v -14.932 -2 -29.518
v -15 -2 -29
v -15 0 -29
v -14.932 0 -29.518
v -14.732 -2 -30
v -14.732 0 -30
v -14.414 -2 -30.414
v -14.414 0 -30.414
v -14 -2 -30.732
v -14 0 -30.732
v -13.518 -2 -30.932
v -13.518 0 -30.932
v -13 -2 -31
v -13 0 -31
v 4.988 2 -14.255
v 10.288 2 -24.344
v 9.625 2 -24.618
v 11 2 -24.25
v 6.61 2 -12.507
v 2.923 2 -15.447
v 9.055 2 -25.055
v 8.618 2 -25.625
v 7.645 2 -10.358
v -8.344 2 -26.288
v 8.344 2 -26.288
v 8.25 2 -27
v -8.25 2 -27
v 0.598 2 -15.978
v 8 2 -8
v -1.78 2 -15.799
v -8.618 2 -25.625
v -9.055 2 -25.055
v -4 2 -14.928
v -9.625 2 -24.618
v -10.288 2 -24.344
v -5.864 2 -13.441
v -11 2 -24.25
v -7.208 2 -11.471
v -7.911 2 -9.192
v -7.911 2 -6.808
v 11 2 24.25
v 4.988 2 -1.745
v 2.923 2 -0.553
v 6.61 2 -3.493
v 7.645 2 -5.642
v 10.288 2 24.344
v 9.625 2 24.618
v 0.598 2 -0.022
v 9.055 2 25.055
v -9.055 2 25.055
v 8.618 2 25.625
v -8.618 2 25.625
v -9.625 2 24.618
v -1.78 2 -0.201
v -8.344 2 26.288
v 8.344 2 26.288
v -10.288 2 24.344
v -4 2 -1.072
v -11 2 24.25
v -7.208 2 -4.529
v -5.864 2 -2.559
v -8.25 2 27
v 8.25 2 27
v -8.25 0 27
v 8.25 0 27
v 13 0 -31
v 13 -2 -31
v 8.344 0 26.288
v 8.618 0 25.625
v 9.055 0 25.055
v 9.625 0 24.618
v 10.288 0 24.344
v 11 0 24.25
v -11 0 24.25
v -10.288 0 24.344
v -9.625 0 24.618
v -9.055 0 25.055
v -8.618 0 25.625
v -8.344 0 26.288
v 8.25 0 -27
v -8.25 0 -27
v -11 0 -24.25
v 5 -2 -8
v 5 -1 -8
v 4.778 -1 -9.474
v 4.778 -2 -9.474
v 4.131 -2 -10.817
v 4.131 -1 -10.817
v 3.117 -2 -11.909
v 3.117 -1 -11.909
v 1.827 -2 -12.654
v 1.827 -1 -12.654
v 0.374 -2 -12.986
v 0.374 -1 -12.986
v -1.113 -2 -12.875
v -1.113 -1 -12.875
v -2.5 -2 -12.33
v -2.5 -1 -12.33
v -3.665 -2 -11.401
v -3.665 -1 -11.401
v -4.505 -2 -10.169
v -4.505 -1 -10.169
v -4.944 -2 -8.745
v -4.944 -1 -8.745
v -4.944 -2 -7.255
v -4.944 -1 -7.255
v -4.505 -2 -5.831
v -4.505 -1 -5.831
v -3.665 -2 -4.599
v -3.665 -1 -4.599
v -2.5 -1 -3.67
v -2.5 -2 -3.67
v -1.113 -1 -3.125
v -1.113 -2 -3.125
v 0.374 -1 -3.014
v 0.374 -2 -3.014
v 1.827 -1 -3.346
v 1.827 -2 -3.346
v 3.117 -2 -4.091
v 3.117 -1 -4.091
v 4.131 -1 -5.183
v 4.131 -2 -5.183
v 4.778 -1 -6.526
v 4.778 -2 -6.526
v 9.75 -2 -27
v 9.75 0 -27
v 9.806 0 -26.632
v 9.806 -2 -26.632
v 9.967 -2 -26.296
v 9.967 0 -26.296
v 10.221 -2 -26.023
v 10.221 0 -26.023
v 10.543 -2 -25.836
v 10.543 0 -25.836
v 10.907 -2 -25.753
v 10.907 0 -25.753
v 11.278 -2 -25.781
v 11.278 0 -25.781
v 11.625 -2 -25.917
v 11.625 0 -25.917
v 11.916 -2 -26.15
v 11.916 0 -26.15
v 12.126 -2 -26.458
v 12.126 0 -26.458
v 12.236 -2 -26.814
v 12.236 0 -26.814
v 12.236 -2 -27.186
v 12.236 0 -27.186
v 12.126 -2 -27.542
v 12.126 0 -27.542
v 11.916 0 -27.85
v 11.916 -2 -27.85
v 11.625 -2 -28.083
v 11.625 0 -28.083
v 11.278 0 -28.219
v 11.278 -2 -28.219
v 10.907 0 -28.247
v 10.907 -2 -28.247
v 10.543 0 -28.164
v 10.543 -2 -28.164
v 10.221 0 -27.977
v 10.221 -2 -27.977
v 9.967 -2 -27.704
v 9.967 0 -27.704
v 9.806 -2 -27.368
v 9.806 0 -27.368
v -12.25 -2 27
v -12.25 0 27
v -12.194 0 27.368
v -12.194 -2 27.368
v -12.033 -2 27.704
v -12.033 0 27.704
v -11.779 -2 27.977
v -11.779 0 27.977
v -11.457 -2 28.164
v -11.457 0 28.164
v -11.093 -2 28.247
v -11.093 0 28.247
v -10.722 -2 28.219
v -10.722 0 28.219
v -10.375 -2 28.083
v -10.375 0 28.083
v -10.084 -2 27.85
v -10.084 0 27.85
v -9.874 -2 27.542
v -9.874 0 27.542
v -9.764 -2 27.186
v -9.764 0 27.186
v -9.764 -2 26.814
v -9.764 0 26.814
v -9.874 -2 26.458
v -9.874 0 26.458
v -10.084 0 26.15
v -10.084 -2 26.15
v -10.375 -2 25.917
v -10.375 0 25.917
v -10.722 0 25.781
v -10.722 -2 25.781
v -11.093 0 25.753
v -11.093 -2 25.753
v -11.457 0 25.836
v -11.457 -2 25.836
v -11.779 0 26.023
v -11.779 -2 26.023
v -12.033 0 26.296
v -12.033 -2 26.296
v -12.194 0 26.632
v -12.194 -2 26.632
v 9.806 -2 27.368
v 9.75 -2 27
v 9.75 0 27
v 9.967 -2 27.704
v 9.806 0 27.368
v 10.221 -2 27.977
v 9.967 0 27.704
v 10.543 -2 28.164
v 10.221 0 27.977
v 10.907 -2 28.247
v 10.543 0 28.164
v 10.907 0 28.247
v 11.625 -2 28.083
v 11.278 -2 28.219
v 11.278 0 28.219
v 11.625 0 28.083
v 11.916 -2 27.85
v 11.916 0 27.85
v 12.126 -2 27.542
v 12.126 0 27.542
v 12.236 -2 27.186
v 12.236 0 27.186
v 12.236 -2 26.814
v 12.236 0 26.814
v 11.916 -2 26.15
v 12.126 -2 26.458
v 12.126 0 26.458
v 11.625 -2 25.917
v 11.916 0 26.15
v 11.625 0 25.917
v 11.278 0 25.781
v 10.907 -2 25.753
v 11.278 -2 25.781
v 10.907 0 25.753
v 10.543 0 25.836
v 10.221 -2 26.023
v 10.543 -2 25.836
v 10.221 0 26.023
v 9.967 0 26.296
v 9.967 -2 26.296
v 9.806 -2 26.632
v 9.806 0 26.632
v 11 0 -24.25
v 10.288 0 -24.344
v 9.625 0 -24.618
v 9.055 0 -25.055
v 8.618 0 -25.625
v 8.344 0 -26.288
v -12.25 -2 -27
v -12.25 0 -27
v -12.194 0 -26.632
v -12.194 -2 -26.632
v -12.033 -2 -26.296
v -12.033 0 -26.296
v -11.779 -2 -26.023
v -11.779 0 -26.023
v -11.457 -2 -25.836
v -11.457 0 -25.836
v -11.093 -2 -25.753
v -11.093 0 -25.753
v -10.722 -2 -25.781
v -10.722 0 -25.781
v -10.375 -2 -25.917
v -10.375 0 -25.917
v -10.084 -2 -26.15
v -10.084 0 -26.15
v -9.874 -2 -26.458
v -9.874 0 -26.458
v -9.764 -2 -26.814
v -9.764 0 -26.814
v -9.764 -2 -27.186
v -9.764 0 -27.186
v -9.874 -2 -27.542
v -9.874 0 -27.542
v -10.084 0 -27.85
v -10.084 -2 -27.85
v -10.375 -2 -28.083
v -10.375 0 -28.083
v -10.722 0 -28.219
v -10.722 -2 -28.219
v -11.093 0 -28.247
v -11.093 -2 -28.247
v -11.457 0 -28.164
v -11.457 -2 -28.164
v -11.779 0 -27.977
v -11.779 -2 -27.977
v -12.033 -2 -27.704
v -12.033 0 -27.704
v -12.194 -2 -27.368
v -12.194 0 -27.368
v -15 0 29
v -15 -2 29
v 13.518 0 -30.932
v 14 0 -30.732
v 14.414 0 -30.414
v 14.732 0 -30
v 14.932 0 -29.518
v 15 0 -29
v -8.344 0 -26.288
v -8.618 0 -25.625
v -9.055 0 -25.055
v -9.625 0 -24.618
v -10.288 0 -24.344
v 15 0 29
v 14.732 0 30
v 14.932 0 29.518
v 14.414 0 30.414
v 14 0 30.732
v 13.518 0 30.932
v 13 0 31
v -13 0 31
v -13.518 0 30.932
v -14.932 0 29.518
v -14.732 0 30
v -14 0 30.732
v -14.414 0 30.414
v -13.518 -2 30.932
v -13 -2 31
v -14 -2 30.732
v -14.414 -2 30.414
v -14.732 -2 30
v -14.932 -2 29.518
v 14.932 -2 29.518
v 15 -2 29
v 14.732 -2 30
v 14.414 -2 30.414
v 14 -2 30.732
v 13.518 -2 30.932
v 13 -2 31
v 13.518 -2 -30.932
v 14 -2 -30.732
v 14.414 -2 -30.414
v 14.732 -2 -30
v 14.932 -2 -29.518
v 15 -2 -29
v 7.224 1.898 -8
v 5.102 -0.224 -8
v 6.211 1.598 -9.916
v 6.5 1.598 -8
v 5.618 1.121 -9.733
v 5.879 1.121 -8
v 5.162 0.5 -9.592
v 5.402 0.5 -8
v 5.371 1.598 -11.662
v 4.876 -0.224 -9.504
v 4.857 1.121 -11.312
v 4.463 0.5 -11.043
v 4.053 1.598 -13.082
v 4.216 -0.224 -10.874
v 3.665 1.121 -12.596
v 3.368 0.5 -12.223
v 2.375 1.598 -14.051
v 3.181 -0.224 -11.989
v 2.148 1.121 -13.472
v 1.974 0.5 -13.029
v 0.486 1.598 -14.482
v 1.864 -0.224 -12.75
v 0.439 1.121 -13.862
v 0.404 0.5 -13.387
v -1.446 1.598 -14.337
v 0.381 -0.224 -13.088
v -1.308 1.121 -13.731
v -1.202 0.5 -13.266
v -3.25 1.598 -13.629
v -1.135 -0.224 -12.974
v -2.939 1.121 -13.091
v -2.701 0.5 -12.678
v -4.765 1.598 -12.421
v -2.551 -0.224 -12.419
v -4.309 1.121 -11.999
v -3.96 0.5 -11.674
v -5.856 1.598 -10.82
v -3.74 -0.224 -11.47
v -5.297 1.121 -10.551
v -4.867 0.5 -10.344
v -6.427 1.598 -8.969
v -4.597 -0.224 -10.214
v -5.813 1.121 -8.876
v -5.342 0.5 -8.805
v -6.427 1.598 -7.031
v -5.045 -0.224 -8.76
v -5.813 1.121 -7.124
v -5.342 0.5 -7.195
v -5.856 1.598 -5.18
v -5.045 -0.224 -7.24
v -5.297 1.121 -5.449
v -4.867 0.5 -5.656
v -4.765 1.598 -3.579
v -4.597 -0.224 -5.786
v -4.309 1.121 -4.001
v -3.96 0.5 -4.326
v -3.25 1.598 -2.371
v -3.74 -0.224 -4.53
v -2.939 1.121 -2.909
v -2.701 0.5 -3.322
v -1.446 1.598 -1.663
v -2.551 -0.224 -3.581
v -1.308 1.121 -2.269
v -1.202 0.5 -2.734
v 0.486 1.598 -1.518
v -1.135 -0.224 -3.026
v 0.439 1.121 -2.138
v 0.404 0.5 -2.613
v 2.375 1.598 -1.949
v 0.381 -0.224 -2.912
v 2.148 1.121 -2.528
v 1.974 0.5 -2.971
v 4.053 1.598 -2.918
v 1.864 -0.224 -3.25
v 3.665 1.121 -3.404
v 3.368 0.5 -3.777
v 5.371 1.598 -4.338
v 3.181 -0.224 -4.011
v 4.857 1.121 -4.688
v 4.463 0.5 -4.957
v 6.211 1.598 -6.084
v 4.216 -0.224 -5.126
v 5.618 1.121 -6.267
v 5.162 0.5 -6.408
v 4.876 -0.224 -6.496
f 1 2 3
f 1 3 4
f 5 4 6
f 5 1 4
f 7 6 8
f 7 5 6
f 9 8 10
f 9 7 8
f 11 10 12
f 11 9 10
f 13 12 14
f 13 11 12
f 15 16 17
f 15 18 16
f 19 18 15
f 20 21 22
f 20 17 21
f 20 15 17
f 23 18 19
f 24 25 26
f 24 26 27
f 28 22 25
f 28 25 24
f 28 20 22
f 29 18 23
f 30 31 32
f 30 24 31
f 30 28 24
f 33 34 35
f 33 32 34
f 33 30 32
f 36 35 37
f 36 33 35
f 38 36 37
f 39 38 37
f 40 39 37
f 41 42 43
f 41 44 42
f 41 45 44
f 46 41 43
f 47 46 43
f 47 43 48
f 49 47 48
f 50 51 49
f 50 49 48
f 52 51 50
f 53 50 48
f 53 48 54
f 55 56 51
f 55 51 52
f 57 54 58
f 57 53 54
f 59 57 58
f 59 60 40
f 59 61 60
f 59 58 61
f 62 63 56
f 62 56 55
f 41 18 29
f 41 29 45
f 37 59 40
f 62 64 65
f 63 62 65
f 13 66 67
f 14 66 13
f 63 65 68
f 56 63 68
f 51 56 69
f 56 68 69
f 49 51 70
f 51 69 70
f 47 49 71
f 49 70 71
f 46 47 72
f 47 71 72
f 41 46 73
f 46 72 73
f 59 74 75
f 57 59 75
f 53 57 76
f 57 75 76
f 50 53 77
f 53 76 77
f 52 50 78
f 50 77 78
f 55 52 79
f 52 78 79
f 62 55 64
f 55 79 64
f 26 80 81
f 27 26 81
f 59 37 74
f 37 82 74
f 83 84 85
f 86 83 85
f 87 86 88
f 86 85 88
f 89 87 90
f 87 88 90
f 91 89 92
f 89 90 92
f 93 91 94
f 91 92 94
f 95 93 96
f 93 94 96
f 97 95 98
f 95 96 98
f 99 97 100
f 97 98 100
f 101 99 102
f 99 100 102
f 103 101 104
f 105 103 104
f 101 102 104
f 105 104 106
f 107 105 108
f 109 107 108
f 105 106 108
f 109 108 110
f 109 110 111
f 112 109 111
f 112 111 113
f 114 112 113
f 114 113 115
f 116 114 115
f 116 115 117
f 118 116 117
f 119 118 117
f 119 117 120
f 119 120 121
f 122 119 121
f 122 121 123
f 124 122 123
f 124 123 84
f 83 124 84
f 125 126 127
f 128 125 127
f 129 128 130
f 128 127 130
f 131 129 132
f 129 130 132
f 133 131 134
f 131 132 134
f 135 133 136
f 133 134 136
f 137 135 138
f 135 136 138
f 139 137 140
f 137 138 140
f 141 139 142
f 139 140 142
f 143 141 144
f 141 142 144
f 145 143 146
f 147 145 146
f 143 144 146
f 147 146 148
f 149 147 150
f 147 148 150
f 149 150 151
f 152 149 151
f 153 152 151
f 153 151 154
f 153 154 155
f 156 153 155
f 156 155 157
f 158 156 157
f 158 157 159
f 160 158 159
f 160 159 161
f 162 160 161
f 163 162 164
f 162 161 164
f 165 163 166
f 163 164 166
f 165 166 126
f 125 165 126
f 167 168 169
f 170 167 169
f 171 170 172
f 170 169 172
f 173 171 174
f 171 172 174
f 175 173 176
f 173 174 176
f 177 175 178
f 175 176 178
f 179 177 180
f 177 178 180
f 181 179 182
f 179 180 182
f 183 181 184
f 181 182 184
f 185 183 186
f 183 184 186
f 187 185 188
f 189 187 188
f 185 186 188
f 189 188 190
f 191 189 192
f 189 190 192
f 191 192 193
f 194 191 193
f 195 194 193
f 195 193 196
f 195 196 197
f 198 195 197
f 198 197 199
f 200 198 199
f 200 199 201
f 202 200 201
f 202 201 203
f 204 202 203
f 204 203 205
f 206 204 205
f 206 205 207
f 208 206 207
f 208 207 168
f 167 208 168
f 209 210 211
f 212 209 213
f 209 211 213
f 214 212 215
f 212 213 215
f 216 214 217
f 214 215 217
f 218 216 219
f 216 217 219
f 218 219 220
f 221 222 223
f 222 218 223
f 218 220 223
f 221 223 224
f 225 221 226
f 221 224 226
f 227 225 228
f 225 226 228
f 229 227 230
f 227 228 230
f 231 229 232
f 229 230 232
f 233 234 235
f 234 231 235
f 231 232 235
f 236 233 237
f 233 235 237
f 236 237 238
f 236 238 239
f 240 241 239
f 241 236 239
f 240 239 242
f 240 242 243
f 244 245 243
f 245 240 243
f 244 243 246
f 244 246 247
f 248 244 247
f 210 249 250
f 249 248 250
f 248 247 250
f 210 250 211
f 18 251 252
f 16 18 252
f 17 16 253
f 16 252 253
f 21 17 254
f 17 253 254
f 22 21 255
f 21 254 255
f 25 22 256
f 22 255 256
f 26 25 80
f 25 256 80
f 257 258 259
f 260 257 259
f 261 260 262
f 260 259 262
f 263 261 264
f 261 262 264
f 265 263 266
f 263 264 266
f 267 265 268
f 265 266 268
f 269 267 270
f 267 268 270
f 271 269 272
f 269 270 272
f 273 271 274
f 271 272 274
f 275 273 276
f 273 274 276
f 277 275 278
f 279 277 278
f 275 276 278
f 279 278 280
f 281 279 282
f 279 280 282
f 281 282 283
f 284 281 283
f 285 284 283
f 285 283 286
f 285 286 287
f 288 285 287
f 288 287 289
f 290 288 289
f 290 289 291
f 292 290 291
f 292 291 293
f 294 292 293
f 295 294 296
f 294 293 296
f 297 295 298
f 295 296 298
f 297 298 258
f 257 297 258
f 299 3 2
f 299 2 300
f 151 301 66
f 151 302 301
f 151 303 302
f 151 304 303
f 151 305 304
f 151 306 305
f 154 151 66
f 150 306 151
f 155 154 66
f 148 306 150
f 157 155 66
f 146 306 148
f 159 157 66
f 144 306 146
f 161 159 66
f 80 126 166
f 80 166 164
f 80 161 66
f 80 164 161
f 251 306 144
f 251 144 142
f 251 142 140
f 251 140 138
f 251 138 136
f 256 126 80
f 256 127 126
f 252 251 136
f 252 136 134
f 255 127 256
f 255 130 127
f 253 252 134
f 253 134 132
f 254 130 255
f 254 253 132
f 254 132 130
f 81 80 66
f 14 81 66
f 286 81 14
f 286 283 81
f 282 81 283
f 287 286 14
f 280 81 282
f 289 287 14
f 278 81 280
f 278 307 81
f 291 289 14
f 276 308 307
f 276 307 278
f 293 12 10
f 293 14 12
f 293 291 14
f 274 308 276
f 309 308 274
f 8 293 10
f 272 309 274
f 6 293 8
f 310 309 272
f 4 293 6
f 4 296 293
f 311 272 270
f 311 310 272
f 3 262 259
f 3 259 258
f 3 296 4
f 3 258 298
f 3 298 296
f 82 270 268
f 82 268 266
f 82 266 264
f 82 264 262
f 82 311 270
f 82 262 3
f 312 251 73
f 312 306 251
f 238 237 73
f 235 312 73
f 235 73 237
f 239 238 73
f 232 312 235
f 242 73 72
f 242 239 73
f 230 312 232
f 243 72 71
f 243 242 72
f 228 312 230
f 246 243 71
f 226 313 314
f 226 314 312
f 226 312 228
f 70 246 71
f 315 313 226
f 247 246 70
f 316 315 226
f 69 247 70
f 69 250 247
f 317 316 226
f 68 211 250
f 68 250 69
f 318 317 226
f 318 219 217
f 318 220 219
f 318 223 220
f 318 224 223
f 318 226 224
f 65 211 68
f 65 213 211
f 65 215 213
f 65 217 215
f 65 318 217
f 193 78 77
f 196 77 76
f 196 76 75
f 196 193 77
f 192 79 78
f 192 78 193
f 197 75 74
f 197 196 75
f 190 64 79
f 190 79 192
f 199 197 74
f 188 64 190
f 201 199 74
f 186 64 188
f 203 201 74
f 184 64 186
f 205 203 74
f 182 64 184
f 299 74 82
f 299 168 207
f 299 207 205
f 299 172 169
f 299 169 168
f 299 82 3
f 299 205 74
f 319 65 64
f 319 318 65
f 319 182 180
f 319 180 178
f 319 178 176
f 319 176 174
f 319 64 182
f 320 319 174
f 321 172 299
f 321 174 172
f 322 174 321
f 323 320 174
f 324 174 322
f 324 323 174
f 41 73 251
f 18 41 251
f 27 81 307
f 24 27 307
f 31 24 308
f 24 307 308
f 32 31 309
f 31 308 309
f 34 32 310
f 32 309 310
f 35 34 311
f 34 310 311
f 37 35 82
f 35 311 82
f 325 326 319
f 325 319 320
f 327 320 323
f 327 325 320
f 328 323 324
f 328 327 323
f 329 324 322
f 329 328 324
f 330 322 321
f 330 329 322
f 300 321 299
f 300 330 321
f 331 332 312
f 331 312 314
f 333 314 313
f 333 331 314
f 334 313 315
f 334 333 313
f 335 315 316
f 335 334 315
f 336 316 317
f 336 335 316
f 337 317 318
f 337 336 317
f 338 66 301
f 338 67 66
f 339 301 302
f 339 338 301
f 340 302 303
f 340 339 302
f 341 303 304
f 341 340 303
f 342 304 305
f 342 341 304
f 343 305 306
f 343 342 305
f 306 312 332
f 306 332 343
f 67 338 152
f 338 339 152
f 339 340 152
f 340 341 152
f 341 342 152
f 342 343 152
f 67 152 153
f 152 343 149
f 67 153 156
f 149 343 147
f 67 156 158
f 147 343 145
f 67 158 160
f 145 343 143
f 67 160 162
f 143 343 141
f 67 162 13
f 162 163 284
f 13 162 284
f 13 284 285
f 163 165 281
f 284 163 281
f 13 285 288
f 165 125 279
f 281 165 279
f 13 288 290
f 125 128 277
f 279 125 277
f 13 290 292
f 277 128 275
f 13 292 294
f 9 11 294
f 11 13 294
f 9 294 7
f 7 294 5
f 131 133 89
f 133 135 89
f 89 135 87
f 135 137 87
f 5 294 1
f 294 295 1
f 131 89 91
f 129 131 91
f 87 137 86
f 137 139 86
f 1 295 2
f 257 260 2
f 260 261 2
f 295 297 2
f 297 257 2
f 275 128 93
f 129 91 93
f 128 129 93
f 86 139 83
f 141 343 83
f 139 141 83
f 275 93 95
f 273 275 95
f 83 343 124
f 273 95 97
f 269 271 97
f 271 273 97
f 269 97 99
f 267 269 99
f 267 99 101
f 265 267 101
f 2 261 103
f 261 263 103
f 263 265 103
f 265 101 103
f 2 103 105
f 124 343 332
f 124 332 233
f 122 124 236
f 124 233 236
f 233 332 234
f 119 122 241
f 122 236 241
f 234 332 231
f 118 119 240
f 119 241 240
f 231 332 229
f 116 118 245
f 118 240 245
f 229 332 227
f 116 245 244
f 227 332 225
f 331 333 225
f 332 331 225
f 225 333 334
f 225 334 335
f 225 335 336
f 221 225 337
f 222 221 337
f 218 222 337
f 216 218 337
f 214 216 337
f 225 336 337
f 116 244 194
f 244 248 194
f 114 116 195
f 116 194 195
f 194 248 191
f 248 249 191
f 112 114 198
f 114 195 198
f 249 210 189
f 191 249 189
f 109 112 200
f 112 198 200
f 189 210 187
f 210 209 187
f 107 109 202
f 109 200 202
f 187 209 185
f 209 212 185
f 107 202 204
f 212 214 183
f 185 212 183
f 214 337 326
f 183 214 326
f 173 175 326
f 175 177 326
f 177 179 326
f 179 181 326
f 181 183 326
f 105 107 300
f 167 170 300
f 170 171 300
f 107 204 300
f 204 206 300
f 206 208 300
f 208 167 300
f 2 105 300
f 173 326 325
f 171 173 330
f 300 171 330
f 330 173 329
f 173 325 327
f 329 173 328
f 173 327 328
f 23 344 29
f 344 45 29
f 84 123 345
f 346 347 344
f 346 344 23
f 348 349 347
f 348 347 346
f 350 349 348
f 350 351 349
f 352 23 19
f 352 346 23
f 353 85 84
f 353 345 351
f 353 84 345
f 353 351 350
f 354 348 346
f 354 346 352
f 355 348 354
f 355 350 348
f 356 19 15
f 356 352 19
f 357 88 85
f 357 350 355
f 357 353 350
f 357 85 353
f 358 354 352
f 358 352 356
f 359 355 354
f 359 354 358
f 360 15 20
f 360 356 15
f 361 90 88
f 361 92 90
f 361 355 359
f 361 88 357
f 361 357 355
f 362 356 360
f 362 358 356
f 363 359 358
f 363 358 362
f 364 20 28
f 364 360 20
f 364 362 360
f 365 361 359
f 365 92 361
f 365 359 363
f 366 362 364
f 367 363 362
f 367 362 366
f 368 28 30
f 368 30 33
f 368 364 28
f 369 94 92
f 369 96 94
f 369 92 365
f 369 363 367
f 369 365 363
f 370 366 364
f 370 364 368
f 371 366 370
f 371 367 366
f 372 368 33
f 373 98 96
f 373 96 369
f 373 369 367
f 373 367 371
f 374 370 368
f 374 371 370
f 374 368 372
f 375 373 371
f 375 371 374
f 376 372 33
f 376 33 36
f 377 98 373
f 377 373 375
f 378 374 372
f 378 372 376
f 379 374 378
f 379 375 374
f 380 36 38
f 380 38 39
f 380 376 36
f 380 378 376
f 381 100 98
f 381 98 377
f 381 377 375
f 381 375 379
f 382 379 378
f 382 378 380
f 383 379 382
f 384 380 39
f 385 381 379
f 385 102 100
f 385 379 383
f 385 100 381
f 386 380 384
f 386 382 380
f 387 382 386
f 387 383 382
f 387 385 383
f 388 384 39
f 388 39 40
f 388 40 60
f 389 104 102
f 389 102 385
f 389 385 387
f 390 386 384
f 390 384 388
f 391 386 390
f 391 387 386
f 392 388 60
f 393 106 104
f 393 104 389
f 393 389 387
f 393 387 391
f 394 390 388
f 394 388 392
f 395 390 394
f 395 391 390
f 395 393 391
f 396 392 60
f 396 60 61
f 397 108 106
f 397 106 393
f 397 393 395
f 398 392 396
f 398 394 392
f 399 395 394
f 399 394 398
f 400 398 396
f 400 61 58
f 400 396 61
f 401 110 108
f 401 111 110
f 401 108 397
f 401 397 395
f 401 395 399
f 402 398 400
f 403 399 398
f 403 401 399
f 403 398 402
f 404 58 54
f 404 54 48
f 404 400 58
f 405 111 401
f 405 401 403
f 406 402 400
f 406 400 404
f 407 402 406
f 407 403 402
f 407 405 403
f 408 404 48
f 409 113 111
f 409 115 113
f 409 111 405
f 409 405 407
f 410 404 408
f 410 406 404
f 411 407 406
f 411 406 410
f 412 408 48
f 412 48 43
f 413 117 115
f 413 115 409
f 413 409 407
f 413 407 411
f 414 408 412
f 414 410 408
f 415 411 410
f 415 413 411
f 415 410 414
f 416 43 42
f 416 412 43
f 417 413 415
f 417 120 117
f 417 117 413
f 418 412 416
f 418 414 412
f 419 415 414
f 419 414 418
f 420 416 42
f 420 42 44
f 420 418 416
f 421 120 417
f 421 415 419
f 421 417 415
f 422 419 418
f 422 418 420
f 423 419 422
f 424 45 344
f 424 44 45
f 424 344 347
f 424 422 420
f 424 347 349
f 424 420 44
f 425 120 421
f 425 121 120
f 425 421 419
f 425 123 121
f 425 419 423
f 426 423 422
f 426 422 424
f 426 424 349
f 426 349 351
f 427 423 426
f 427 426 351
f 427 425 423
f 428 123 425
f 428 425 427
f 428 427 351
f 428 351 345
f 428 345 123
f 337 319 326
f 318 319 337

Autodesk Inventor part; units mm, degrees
ref_plane "YZ Plane" through (0, 0, 0) normal (1, 0, 0) x (0, 1, 0)
ref_plane "XZ Plane" through (0, 0, 0) normal (0, 1, 0) x (-1, 0, 0)
ref_plane "XY Plane" through (0, 0, 0) normal (0, 0, 1) x (1, 0, 0)
sketch "스케치1" plane through (0, 0, 0) normal (0, 1, 0) x (-1, 0, 0)
  line L0 (11, 27) -> (-11, 27)
  line L1 (-11, 27) -> (-11, -27)
  line L2 (-11, -27) -> (11, -27)
  line L3 (11, -27) -> (11, 27)
  line L4 (11, 27) -> (-11, -27) construction
  line L5 (-11, 27) -> (11, -27) construction
  line L6 (15, 31) -> (-15, 31)
  line L7 (-15, 31) -> (-15, -31)
  line L8 (-15, -31) -> (15, -31)
  line L9 (15, -31) -> (15, 31)
  circle A0 centre (11, 27) radius 1.25
  line L10 (0, 0) -> (0, -5.338)
  line L11 (0, 0) -> (0.8274, 0)
  line L12 (0, 0) -> (4.4604, 0)
  circle A1 centre (11, 27) radius 2.75
  circle A2 centre (11, -27) radius 1.25
  circle A3 centre (11, -27) radius 2.75
  circle A4 centre (-11, 27) radius 1.25
  circle A5 centre (-11, 27) radius 2.75
  circle A6 centre (-11, -27) radius 1.25
  circle A7 centre (-11, -27) radius 2.75
  point P0 (-11, -24.25)
  point P1 (-8.25, -27)
  point P2 (8.25, -27)
  point P3 (11, -24.25)
  point P4 (11, 24.25)
  point P5 (8.25, 27)
  point P6 (-8.25, 27)
  point P7 (-11, 24.25)
  dimension "d0" = 22
  dimension "d1" = 54
  dimension "d2" = 4
  dimension "d3" = 2.5
  dimension "d4" = 5.5
extrude "돌출1" add sketch "스케치1" against normal blind 2 contours A5 L1 A4 L0 | L0 A4 L1 A5 | L0 A1 L3 A3 L2 A7 L1 A5 | A1 L3 A0 L0 | L0 A0 L3 A1 | A7 L2 A6 L1 | L1 A6 L2 A7 | A3 L2 A2 L3 | L3 A2 L2 A3 | L9 L8 L7 L6
extrude "돌출2" add sketch "스케치1" along normal blind 2 contours L0 A1 L3 A3 L2 A7 L1 A5
fillet "모깎기1" radius 2 4 edges at (15, -1, -31) (-15, -1, -31) (15, -1, 31) (-15, -1, 31)
sketch "스케치2" plane through (0, 2, 0) normal (0, 1, 0) x (1, 0, 0)
  circle A0 centre (0, 8) radius 5
  line L0 (13, 31) -> (-13, 31) projected
  point P0 (0, 0)
  dimension "d10" = 23
  dimension "d11" = 10
extrude "돌출3" cut sketch "스케치2" against normal blind 4
fillet "모깎기2" radius 3 1 edges at (-5, 2, -8)
properties part number "커튼 서보 커버"
